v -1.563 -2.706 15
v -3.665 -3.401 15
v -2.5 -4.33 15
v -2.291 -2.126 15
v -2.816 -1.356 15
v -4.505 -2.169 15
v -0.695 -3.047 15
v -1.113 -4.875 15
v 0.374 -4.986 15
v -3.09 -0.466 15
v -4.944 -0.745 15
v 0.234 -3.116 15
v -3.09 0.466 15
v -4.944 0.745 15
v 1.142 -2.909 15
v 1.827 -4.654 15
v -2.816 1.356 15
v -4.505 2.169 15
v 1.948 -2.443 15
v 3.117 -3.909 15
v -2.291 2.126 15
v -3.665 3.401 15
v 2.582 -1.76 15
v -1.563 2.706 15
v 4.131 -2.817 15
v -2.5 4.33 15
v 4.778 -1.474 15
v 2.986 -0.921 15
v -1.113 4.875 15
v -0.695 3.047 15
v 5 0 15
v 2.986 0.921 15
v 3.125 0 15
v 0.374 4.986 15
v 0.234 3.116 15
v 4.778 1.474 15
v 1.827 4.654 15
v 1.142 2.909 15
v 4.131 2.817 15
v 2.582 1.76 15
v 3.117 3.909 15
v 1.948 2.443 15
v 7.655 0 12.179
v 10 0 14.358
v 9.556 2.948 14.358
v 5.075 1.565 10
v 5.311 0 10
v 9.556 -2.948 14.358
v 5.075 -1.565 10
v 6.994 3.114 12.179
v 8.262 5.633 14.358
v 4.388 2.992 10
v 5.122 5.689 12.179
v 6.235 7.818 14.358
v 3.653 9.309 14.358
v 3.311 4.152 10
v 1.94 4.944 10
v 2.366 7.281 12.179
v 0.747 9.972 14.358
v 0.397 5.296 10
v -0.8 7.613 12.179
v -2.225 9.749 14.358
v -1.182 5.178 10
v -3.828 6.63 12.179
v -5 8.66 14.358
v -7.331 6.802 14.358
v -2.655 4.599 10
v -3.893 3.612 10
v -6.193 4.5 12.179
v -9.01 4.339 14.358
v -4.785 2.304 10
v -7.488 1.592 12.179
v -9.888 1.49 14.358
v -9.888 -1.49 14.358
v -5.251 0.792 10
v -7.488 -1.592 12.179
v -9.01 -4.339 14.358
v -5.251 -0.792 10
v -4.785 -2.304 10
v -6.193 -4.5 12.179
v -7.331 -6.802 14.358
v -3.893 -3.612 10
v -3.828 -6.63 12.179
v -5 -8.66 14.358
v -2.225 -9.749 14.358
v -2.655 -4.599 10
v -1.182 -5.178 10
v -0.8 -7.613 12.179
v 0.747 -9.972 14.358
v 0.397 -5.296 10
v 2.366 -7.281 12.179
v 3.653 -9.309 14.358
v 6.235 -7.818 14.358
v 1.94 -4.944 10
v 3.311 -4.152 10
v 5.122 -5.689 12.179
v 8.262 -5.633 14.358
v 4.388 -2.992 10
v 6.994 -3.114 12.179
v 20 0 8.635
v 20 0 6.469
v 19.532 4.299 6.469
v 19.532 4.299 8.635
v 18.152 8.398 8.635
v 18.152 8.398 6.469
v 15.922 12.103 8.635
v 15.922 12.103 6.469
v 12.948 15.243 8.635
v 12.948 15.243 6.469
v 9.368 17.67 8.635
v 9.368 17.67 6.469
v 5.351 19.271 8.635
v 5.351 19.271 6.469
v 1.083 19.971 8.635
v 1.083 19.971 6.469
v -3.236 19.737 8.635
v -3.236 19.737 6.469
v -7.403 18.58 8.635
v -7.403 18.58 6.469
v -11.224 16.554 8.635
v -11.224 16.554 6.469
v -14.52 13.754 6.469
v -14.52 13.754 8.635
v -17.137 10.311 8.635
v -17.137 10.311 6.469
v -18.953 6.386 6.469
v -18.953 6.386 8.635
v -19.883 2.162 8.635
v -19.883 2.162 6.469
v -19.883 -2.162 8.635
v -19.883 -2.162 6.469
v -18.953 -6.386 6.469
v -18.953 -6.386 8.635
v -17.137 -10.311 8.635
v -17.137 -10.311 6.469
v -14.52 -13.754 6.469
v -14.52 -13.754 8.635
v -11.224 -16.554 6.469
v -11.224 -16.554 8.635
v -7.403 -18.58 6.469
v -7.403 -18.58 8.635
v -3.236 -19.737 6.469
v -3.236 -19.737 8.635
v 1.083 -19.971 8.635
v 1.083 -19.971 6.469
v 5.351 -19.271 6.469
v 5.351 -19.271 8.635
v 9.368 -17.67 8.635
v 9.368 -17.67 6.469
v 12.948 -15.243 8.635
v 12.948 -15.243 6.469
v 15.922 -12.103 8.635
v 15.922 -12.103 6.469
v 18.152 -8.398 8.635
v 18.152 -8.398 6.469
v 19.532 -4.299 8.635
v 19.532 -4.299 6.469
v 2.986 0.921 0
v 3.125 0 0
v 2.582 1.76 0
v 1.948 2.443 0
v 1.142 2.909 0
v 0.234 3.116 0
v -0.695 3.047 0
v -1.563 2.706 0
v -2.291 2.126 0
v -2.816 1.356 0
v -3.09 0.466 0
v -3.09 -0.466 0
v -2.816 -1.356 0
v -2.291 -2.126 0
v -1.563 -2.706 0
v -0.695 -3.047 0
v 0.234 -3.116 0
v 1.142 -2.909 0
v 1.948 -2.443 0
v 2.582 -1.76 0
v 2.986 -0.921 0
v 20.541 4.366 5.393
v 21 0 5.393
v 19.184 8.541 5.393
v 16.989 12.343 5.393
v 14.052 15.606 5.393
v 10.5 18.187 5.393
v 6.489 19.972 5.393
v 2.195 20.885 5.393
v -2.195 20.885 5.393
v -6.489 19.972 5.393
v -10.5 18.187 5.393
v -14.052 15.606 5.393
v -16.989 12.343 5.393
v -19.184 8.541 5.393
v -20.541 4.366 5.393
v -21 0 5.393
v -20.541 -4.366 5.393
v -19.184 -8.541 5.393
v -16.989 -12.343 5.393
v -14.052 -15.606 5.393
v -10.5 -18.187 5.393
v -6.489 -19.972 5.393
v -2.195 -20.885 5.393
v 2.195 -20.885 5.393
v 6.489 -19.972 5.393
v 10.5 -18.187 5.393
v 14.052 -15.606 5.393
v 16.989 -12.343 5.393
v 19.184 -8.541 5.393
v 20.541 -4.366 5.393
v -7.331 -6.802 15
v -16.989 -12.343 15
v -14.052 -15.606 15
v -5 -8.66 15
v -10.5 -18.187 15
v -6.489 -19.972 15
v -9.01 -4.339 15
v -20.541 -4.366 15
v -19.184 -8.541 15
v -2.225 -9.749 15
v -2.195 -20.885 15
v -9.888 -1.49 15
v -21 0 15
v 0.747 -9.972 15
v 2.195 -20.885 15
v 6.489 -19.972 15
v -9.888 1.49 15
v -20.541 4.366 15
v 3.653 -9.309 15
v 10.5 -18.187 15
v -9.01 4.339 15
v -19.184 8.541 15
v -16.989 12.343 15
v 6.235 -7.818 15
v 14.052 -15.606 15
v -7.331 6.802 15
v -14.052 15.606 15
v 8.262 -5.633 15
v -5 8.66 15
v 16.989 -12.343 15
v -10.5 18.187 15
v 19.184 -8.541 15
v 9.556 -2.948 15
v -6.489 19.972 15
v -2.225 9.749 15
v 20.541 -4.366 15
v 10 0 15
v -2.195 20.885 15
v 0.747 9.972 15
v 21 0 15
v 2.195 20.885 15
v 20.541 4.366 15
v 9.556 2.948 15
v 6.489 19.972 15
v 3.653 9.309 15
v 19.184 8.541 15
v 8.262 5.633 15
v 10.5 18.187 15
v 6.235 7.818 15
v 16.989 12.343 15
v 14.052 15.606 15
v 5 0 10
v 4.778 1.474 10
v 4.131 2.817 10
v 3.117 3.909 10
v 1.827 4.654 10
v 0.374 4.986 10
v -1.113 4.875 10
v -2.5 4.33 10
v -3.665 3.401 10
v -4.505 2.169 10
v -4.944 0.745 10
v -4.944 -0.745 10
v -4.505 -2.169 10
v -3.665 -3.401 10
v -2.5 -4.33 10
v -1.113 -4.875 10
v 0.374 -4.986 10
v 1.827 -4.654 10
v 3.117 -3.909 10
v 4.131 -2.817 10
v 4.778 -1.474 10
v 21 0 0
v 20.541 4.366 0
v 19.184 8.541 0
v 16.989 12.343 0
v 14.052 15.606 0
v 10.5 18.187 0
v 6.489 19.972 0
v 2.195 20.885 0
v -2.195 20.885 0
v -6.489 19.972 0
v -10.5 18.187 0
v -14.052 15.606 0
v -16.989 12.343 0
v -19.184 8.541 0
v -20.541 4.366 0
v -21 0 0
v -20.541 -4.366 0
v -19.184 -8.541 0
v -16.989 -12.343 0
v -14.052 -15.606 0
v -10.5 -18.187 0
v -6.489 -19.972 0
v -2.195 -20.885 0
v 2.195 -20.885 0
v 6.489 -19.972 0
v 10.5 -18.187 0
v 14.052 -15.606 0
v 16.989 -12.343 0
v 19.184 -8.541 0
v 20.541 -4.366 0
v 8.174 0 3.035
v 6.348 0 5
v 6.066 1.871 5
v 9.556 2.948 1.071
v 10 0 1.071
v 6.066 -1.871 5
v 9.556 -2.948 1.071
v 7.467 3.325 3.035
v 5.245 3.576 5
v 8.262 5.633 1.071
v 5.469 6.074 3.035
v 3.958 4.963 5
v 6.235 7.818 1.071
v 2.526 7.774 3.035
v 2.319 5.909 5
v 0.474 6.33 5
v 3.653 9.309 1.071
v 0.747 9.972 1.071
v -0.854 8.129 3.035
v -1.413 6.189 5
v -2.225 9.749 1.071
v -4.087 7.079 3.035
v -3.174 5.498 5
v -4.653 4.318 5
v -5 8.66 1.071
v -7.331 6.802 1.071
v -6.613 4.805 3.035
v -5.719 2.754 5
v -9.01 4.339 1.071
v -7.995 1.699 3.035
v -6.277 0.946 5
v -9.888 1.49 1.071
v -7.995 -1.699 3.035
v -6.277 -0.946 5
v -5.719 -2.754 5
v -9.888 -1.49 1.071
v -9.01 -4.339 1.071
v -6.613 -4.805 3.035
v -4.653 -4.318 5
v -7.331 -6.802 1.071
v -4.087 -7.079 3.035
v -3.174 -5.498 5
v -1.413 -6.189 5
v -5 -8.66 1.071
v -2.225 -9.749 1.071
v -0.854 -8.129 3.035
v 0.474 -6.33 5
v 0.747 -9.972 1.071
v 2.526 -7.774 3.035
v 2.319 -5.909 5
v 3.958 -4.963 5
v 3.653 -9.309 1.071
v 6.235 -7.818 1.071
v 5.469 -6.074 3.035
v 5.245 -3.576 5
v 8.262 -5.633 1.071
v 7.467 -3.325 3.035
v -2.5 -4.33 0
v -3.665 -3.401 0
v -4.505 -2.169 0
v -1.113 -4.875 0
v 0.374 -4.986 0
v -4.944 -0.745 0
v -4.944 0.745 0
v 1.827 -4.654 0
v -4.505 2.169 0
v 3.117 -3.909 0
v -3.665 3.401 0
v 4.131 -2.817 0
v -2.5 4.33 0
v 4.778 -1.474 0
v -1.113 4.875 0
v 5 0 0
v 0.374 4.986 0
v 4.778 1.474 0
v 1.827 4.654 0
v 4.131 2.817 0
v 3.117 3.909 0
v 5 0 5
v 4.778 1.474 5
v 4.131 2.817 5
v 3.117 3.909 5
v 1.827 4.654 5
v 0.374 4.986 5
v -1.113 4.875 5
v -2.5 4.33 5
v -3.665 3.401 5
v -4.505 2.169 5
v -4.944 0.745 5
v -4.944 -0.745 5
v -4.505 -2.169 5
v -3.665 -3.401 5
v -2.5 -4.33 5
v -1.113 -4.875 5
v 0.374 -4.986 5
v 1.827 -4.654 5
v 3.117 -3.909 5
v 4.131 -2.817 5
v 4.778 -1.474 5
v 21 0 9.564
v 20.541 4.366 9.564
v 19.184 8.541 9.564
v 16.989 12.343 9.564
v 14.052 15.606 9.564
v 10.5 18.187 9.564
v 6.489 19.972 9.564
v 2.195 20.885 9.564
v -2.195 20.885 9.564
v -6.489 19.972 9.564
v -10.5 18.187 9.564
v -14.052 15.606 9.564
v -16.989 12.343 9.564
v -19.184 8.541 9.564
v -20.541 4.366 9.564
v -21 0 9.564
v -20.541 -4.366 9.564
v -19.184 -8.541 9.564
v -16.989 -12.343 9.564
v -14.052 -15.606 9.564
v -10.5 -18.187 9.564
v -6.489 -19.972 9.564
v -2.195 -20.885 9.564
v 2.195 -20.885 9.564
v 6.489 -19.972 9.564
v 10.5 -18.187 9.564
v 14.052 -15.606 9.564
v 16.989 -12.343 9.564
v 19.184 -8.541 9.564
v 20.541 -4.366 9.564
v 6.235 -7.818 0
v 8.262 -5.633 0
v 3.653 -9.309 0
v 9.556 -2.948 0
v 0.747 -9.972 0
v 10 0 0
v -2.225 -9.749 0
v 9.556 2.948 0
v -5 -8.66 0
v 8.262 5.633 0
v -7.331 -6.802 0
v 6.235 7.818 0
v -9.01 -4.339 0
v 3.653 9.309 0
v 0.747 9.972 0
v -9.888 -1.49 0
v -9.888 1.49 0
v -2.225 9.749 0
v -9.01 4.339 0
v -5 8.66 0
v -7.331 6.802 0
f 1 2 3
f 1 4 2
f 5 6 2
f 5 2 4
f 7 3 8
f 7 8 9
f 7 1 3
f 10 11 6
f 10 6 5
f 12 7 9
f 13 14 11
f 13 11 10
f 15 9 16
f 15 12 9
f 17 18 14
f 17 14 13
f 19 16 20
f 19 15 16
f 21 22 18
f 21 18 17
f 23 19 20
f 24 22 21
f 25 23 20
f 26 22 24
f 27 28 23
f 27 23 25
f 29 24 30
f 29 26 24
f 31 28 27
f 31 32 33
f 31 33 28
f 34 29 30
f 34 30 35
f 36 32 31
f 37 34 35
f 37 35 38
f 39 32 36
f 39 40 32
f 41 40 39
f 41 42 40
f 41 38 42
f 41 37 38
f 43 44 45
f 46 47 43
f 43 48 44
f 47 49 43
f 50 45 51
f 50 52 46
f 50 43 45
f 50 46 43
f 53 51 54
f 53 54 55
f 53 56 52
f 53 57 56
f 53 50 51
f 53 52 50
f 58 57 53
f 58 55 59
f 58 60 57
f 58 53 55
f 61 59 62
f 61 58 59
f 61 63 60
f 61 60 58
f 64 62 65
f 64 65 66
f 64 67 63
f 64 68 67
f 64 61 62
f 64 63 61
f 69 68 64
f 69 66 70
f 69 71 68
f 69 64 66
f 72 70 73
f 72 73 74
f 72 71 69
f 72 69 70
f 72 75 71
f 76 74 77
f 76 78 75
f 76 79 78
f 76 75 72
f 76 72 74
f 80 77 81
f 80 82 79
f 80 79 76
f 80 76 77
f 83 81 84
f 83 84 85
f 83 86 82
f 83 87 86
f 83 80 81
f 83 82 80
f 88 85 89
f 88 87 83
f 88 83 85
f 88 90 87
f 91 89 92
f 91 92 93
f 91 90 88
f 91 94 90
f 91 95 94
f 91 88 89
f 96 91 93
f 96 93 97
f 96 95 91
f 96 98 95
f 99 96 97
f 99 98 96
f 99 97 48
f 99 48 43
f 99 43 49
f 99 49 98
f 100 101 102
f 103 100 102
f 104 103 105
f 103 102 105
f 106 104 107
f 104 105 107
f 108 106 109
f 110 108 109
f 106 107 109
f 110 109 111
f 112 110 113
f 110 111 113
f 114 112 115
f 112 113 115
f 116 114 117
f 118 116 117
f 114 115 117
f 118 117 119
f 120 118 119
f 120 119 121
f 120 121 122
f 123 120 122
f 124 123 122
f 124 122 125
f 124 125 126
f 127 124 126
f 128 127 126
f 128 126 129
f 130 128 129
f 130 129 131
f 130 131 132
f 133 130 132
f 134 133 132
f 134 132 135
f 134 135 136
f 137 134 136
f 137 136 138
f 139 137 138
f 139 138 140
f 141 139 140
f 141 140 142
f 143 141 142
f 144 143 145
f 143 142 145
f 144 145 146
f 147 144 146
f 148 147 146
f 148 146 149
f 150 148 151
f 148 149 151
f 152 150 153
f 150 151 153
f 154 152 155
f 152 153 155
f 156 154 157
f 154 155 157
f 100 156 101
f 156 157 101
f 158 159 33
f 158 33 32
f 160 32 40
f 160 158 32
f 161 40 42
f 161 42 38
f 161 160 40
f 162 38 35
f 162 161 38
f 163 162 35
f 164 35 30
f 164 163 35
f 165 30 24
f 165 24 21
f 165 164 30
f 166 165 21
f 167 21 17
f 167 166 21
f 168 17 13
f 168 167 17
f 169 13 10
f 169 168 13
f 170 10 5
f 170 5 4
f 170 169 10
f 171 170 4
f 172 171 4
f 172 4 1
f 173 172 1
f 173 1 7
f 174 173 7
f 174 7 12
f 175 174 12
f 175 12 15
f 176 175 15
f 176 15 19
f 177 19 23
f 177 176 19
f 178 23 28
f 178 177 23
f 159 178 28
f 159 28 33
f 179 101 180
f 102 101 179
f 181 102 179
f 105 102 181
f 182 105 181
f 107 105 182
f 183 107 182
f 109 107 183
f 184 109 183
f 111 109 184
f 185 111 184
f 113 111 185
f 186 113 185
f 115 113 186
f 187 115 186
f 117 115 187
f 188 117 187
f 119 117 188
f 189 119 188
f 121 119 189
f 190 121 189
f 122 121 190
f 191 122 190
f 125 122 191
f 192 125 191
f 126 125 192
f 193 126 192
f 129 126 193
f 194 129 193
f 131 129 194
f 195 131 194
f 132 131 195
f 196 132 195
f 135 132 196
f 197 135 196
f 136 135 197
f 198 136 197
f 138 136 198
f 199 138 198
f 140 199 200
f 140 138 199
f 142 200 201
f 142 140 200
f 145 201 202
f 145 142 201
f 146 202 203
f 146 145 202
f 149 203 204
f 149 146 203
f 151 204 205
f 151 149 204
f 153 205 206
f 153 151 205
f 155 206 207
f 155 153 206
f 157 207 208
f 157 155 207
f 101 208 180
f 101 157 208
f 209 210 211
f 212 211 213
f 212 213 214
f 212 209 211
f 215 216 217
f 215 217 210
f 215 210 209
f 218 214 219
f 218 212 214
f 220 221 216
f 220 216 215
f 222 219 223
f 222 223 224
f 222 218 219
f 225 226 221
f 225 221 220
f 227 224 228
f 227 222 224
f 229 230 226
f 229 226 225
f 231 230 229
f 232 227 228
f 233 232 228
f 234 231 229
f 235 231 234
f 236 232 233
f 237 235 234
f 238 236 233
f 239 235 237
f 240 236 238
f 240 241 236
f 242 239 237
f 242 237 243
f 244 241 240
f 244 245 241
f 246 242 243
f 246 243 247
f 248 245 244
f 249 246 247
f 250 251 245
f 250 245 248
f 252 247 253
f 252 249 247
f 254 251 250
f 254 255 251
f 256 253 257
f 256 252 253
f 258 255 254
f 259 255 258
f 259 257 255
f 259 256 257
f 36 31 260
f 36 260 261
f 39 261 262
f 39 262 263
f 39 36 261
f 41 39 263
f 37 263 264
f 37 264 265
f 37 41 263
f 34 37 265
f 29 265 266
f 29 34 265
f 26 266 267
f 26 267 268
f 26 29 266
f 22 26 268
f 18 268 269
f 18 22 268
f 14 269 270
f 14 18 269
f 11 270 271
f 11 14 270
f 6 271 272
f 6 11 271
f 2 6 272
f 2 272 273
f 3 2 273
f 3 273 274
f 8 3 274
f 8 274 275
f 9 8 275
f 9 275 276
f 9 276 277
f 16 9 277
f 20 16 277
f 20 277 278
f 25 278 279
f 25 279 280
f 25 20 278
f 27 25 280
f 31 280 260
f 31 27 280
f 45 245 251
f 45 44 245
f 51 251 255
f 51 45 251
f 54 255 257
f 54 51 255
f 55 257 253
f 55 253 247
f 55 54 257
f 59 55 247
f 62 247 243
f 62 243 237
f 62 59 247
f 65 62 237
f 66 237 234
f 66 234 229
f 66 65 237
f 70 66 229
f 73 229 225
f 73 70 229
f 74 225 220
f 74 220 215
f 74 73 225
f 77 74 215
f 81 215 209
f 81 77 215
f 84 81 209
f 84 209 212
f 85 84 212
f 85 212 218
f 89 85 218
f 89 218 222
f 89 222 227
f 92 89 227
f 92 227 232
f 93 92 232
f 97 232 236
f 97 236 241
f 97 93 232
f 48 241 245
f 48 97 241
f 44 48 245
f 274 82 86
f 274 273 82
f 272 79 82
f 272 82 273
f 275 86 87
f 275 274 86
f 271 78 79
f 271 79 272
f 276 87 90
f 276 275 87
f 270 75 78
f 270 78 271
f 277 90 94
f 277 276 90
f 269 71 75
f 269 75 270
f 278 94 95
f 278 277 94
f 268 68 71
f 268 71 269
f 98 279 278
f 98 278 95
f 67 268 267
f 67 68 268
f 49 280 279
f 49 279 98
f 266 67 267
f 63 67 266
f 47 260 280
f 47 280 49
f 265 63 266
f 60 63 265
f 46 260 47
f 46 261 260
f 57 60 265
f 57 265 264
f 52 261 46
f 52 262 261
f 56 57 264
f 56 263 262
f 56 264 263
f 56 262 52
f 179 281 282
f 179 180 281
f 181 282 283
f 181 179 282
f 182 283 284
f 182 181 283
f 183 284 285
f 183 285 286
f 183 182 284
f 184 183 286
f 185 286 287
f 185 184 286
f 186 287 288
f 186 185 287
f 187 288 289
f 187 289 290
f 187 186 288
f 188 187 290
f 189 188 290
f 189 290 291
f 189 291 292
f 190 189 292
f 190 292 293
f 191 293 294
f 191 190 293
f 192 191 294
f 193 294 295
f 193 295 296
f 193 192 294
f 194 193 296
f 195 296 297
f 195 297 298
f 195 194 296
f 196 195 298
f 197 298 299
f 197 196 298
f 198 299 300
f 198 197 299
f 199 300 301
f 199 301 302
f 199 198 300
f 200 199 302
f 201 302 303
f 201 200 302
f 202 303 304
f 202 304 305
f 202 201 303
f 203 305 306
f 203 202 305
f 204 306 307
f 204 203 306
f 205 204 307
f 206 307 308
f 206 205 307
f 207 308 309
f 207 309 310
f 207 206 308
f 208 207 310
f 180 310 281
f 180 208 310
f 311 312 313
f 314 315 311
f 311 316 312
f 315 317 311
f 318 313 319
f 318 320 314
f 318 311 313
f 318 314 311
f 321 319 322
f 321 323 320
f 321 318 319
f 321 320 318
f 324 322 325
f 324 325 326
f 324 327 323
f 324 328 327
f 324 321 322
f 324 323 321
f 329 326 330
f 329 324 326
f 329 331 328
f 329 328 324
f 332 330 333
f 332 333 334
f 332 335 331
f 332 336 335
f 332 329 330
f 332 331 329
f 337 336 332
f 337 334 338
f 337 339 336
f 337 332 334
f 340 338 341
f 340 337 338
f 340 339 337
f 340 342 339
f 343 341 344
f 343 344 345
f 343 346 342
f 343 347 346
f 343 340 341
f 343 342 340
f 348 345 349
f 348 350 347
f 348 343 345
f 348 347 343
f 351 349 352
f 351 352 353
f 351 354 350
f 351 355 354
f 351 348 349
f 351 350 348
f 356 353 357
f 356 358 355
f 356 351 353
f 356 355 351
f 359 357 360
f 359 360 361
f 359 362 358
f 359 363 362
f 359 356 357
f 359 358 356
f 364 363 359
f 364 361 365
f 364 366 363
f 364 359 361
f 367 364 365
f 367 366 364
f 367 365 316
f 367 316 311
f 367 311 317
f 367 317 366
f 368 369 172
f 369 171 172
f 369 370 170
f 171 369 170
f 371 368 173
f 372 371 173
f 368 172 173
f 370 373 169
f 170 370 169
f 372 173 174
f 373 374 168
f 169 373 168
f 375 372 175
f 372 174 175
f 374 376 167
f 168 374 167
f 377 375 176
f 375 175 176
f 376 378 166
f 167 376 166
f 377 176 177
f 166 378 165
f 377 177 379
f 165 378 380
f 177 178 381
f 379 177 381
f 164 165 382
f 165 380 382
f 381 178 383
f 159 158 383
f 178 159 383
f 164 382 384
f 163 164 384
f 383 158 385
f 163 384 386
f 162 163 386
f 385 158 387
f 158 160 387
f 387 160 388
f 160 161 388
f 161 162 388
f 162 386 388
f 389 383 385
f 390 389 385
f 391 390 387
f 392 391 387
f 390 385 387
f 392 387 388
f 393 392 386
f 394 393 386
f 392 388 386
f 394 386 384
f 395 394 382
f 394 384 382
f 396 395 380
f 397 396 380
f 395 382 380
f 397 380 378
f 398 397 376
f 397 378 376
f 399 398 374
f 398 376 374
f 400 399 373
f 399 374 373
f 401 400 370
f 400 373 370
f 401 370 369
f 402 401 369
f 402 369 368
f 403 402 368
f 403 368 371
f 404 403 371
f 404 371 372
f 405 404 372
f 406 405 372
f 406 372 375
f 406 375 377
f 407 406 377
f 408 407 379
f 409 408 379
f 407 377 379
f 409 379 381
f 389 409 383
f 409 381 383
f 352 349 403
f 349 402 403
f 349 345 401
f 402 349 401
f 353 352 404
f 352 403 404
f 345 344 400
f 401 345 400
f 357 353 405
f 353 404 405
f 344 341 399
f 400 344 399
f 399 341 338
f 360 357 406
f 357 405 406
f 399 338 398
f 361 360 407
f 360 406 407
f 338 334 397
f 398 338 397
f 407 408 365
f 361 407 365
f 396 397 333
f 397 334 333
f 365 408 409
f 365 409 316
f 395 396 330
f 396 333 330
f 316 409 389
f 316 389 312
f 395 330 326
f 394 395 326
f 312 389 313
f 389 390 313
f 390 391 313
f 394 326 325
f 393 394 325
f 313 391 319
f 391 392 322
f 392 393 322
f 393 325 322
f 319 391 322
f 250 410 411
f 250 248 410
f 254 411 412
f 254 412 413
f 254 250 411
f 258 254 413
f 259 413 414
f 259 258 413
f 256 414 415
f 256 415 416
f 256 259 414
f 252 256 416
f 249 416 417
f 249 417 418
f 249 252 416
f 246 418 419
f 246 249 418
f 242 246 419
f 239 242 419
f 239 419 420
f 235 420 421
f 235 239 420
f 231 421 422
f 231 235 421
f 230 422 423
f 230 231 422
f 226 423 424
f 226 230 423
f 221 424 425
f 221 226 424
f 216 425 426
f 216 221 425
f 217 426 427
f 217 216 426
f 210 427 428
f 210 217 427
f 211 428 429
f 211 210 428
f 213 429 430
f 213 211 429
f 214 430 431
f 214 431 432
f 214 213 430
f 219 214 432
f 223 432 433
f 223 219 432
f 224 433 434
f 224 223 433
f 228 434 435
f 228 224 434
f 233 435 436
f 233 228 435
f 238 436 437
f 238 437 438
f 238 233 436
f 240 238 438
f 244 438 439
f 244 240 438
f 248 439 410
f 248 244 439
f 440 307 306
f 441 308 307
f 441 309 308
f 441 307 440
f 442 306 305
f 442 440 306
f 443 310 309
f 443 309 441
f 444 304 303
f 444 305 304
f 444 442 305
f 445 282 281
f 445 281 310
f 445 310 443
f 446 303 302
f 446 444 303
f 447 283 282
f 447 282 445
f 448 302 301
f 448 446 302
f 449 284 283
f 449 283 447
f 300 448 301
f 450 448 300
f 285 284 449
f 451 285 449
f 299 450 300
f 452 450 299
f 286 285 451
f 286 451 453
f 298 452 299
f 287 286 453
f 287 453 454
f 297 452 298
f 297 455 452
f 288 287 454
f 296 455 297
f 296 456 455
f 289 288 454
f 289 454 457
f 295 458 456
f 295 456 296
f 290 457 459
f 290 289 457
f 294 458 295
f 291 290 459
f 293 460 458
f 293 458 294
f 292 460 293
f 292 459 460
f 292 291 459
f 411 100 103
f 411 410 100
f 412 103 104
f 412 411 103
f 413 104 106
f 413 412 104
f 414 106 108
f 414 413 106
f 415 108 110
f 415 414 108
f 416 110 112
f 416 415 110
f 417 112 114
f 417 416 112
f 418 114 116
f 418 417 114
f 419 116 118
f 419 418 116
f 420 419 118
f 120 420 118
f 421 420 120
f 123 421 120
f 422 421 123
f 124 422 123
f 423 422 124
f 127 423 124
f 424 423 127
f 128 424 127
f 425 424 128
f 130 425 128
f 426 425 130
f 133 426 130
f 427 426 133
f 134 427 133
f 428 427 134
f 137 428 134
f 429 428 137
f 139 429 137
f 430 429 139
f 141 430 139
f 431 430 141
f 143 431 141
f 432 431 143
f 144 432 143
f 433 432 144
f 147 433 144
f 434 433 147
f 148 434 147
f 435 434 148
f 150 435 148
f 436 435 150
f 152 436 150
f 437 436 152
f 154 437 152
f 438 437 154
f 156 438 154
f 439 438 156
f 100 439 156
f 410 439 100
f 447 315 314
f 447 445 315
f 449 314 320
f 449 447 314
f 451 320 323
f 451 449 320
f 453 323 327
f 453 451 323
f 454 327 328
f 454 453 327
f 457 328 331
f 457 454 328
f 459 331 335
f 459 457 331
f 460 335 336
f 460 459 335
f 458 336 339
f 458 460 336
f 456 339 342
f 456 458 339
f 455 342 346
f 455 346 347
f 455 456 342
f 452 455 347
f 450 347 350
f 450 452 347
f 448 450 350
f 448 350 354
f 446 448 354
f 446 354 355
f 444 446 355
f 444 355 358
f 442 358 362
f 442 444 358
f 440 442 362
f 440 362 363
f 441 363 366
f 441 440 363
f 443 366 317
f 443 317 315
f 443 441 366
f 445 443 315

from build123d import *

# Parameters (mm, degrees)
SKETCH1_R           = 20
SKETCH1_R_2         = 3.125
BOSS_EXTRUDE1_DEPTH = 15
SKETCH2_R           = 16.5
SKETCH2_R_2         = 5
CUT_EXTRUDE1_DEPTH  = 5


# Read off the part's stored shape, not the designer's step: Revolve-Thin19
with BuildPart() as part:
    # Sketch1 → Boss-Extrude1 (new body)
    with BuildSketch(Plane.XY):
        Circle(SKETCH1_R)
        Circle(SKETCH1_R_2, mode=Mode.SUBTRACT)
    extrude(amount=BOSS_EXTRUDE1_DEPTH)

    # Sketch2 → Cut-Extrude1 (cut)
    with BuildSketch(Plane.XY.offset(15)):
        Circle(SKETCH2_R)
        Circle(SKETCH2_R_2, mode=Mode.SUBTRACT)
    cut_extrude1 = extrude(amount=-CUT_EXTRUDE1_DEPTH, mode=Mode.SUBTRACT)

    # Mirror1: Cut-Extrude1 across plane
    add(cut_extrude1.mirror(Plane.XY.offset(7.5)), mode=Mode.SUBTRACT)

    # Revolve-Thin19 outline → Revolve-Thin19 (revolve)
    with BuildSketch(Plane.XZ):
        Polygon((10, 1.070581714), (10, 0), (16.5, 0), (16.5, 5), (6.348063393, 5), align=None)
        Polygon((20, 0), (21, 0), (21, 5.392941829), (20, 6.468923892), align=None)
        Polygon((20, 8.634806339), (21, 9.564189861), (21, 15), (20, 15), align=None)
        Polygon((16.5, 10), (16.5, 15), (10, 15), (10, 14.358101386), (5.310761078, 10), align=None)
    revolve(axis=Axis((0, 0, 0), (0, 0, 1)))


solid = part.part
